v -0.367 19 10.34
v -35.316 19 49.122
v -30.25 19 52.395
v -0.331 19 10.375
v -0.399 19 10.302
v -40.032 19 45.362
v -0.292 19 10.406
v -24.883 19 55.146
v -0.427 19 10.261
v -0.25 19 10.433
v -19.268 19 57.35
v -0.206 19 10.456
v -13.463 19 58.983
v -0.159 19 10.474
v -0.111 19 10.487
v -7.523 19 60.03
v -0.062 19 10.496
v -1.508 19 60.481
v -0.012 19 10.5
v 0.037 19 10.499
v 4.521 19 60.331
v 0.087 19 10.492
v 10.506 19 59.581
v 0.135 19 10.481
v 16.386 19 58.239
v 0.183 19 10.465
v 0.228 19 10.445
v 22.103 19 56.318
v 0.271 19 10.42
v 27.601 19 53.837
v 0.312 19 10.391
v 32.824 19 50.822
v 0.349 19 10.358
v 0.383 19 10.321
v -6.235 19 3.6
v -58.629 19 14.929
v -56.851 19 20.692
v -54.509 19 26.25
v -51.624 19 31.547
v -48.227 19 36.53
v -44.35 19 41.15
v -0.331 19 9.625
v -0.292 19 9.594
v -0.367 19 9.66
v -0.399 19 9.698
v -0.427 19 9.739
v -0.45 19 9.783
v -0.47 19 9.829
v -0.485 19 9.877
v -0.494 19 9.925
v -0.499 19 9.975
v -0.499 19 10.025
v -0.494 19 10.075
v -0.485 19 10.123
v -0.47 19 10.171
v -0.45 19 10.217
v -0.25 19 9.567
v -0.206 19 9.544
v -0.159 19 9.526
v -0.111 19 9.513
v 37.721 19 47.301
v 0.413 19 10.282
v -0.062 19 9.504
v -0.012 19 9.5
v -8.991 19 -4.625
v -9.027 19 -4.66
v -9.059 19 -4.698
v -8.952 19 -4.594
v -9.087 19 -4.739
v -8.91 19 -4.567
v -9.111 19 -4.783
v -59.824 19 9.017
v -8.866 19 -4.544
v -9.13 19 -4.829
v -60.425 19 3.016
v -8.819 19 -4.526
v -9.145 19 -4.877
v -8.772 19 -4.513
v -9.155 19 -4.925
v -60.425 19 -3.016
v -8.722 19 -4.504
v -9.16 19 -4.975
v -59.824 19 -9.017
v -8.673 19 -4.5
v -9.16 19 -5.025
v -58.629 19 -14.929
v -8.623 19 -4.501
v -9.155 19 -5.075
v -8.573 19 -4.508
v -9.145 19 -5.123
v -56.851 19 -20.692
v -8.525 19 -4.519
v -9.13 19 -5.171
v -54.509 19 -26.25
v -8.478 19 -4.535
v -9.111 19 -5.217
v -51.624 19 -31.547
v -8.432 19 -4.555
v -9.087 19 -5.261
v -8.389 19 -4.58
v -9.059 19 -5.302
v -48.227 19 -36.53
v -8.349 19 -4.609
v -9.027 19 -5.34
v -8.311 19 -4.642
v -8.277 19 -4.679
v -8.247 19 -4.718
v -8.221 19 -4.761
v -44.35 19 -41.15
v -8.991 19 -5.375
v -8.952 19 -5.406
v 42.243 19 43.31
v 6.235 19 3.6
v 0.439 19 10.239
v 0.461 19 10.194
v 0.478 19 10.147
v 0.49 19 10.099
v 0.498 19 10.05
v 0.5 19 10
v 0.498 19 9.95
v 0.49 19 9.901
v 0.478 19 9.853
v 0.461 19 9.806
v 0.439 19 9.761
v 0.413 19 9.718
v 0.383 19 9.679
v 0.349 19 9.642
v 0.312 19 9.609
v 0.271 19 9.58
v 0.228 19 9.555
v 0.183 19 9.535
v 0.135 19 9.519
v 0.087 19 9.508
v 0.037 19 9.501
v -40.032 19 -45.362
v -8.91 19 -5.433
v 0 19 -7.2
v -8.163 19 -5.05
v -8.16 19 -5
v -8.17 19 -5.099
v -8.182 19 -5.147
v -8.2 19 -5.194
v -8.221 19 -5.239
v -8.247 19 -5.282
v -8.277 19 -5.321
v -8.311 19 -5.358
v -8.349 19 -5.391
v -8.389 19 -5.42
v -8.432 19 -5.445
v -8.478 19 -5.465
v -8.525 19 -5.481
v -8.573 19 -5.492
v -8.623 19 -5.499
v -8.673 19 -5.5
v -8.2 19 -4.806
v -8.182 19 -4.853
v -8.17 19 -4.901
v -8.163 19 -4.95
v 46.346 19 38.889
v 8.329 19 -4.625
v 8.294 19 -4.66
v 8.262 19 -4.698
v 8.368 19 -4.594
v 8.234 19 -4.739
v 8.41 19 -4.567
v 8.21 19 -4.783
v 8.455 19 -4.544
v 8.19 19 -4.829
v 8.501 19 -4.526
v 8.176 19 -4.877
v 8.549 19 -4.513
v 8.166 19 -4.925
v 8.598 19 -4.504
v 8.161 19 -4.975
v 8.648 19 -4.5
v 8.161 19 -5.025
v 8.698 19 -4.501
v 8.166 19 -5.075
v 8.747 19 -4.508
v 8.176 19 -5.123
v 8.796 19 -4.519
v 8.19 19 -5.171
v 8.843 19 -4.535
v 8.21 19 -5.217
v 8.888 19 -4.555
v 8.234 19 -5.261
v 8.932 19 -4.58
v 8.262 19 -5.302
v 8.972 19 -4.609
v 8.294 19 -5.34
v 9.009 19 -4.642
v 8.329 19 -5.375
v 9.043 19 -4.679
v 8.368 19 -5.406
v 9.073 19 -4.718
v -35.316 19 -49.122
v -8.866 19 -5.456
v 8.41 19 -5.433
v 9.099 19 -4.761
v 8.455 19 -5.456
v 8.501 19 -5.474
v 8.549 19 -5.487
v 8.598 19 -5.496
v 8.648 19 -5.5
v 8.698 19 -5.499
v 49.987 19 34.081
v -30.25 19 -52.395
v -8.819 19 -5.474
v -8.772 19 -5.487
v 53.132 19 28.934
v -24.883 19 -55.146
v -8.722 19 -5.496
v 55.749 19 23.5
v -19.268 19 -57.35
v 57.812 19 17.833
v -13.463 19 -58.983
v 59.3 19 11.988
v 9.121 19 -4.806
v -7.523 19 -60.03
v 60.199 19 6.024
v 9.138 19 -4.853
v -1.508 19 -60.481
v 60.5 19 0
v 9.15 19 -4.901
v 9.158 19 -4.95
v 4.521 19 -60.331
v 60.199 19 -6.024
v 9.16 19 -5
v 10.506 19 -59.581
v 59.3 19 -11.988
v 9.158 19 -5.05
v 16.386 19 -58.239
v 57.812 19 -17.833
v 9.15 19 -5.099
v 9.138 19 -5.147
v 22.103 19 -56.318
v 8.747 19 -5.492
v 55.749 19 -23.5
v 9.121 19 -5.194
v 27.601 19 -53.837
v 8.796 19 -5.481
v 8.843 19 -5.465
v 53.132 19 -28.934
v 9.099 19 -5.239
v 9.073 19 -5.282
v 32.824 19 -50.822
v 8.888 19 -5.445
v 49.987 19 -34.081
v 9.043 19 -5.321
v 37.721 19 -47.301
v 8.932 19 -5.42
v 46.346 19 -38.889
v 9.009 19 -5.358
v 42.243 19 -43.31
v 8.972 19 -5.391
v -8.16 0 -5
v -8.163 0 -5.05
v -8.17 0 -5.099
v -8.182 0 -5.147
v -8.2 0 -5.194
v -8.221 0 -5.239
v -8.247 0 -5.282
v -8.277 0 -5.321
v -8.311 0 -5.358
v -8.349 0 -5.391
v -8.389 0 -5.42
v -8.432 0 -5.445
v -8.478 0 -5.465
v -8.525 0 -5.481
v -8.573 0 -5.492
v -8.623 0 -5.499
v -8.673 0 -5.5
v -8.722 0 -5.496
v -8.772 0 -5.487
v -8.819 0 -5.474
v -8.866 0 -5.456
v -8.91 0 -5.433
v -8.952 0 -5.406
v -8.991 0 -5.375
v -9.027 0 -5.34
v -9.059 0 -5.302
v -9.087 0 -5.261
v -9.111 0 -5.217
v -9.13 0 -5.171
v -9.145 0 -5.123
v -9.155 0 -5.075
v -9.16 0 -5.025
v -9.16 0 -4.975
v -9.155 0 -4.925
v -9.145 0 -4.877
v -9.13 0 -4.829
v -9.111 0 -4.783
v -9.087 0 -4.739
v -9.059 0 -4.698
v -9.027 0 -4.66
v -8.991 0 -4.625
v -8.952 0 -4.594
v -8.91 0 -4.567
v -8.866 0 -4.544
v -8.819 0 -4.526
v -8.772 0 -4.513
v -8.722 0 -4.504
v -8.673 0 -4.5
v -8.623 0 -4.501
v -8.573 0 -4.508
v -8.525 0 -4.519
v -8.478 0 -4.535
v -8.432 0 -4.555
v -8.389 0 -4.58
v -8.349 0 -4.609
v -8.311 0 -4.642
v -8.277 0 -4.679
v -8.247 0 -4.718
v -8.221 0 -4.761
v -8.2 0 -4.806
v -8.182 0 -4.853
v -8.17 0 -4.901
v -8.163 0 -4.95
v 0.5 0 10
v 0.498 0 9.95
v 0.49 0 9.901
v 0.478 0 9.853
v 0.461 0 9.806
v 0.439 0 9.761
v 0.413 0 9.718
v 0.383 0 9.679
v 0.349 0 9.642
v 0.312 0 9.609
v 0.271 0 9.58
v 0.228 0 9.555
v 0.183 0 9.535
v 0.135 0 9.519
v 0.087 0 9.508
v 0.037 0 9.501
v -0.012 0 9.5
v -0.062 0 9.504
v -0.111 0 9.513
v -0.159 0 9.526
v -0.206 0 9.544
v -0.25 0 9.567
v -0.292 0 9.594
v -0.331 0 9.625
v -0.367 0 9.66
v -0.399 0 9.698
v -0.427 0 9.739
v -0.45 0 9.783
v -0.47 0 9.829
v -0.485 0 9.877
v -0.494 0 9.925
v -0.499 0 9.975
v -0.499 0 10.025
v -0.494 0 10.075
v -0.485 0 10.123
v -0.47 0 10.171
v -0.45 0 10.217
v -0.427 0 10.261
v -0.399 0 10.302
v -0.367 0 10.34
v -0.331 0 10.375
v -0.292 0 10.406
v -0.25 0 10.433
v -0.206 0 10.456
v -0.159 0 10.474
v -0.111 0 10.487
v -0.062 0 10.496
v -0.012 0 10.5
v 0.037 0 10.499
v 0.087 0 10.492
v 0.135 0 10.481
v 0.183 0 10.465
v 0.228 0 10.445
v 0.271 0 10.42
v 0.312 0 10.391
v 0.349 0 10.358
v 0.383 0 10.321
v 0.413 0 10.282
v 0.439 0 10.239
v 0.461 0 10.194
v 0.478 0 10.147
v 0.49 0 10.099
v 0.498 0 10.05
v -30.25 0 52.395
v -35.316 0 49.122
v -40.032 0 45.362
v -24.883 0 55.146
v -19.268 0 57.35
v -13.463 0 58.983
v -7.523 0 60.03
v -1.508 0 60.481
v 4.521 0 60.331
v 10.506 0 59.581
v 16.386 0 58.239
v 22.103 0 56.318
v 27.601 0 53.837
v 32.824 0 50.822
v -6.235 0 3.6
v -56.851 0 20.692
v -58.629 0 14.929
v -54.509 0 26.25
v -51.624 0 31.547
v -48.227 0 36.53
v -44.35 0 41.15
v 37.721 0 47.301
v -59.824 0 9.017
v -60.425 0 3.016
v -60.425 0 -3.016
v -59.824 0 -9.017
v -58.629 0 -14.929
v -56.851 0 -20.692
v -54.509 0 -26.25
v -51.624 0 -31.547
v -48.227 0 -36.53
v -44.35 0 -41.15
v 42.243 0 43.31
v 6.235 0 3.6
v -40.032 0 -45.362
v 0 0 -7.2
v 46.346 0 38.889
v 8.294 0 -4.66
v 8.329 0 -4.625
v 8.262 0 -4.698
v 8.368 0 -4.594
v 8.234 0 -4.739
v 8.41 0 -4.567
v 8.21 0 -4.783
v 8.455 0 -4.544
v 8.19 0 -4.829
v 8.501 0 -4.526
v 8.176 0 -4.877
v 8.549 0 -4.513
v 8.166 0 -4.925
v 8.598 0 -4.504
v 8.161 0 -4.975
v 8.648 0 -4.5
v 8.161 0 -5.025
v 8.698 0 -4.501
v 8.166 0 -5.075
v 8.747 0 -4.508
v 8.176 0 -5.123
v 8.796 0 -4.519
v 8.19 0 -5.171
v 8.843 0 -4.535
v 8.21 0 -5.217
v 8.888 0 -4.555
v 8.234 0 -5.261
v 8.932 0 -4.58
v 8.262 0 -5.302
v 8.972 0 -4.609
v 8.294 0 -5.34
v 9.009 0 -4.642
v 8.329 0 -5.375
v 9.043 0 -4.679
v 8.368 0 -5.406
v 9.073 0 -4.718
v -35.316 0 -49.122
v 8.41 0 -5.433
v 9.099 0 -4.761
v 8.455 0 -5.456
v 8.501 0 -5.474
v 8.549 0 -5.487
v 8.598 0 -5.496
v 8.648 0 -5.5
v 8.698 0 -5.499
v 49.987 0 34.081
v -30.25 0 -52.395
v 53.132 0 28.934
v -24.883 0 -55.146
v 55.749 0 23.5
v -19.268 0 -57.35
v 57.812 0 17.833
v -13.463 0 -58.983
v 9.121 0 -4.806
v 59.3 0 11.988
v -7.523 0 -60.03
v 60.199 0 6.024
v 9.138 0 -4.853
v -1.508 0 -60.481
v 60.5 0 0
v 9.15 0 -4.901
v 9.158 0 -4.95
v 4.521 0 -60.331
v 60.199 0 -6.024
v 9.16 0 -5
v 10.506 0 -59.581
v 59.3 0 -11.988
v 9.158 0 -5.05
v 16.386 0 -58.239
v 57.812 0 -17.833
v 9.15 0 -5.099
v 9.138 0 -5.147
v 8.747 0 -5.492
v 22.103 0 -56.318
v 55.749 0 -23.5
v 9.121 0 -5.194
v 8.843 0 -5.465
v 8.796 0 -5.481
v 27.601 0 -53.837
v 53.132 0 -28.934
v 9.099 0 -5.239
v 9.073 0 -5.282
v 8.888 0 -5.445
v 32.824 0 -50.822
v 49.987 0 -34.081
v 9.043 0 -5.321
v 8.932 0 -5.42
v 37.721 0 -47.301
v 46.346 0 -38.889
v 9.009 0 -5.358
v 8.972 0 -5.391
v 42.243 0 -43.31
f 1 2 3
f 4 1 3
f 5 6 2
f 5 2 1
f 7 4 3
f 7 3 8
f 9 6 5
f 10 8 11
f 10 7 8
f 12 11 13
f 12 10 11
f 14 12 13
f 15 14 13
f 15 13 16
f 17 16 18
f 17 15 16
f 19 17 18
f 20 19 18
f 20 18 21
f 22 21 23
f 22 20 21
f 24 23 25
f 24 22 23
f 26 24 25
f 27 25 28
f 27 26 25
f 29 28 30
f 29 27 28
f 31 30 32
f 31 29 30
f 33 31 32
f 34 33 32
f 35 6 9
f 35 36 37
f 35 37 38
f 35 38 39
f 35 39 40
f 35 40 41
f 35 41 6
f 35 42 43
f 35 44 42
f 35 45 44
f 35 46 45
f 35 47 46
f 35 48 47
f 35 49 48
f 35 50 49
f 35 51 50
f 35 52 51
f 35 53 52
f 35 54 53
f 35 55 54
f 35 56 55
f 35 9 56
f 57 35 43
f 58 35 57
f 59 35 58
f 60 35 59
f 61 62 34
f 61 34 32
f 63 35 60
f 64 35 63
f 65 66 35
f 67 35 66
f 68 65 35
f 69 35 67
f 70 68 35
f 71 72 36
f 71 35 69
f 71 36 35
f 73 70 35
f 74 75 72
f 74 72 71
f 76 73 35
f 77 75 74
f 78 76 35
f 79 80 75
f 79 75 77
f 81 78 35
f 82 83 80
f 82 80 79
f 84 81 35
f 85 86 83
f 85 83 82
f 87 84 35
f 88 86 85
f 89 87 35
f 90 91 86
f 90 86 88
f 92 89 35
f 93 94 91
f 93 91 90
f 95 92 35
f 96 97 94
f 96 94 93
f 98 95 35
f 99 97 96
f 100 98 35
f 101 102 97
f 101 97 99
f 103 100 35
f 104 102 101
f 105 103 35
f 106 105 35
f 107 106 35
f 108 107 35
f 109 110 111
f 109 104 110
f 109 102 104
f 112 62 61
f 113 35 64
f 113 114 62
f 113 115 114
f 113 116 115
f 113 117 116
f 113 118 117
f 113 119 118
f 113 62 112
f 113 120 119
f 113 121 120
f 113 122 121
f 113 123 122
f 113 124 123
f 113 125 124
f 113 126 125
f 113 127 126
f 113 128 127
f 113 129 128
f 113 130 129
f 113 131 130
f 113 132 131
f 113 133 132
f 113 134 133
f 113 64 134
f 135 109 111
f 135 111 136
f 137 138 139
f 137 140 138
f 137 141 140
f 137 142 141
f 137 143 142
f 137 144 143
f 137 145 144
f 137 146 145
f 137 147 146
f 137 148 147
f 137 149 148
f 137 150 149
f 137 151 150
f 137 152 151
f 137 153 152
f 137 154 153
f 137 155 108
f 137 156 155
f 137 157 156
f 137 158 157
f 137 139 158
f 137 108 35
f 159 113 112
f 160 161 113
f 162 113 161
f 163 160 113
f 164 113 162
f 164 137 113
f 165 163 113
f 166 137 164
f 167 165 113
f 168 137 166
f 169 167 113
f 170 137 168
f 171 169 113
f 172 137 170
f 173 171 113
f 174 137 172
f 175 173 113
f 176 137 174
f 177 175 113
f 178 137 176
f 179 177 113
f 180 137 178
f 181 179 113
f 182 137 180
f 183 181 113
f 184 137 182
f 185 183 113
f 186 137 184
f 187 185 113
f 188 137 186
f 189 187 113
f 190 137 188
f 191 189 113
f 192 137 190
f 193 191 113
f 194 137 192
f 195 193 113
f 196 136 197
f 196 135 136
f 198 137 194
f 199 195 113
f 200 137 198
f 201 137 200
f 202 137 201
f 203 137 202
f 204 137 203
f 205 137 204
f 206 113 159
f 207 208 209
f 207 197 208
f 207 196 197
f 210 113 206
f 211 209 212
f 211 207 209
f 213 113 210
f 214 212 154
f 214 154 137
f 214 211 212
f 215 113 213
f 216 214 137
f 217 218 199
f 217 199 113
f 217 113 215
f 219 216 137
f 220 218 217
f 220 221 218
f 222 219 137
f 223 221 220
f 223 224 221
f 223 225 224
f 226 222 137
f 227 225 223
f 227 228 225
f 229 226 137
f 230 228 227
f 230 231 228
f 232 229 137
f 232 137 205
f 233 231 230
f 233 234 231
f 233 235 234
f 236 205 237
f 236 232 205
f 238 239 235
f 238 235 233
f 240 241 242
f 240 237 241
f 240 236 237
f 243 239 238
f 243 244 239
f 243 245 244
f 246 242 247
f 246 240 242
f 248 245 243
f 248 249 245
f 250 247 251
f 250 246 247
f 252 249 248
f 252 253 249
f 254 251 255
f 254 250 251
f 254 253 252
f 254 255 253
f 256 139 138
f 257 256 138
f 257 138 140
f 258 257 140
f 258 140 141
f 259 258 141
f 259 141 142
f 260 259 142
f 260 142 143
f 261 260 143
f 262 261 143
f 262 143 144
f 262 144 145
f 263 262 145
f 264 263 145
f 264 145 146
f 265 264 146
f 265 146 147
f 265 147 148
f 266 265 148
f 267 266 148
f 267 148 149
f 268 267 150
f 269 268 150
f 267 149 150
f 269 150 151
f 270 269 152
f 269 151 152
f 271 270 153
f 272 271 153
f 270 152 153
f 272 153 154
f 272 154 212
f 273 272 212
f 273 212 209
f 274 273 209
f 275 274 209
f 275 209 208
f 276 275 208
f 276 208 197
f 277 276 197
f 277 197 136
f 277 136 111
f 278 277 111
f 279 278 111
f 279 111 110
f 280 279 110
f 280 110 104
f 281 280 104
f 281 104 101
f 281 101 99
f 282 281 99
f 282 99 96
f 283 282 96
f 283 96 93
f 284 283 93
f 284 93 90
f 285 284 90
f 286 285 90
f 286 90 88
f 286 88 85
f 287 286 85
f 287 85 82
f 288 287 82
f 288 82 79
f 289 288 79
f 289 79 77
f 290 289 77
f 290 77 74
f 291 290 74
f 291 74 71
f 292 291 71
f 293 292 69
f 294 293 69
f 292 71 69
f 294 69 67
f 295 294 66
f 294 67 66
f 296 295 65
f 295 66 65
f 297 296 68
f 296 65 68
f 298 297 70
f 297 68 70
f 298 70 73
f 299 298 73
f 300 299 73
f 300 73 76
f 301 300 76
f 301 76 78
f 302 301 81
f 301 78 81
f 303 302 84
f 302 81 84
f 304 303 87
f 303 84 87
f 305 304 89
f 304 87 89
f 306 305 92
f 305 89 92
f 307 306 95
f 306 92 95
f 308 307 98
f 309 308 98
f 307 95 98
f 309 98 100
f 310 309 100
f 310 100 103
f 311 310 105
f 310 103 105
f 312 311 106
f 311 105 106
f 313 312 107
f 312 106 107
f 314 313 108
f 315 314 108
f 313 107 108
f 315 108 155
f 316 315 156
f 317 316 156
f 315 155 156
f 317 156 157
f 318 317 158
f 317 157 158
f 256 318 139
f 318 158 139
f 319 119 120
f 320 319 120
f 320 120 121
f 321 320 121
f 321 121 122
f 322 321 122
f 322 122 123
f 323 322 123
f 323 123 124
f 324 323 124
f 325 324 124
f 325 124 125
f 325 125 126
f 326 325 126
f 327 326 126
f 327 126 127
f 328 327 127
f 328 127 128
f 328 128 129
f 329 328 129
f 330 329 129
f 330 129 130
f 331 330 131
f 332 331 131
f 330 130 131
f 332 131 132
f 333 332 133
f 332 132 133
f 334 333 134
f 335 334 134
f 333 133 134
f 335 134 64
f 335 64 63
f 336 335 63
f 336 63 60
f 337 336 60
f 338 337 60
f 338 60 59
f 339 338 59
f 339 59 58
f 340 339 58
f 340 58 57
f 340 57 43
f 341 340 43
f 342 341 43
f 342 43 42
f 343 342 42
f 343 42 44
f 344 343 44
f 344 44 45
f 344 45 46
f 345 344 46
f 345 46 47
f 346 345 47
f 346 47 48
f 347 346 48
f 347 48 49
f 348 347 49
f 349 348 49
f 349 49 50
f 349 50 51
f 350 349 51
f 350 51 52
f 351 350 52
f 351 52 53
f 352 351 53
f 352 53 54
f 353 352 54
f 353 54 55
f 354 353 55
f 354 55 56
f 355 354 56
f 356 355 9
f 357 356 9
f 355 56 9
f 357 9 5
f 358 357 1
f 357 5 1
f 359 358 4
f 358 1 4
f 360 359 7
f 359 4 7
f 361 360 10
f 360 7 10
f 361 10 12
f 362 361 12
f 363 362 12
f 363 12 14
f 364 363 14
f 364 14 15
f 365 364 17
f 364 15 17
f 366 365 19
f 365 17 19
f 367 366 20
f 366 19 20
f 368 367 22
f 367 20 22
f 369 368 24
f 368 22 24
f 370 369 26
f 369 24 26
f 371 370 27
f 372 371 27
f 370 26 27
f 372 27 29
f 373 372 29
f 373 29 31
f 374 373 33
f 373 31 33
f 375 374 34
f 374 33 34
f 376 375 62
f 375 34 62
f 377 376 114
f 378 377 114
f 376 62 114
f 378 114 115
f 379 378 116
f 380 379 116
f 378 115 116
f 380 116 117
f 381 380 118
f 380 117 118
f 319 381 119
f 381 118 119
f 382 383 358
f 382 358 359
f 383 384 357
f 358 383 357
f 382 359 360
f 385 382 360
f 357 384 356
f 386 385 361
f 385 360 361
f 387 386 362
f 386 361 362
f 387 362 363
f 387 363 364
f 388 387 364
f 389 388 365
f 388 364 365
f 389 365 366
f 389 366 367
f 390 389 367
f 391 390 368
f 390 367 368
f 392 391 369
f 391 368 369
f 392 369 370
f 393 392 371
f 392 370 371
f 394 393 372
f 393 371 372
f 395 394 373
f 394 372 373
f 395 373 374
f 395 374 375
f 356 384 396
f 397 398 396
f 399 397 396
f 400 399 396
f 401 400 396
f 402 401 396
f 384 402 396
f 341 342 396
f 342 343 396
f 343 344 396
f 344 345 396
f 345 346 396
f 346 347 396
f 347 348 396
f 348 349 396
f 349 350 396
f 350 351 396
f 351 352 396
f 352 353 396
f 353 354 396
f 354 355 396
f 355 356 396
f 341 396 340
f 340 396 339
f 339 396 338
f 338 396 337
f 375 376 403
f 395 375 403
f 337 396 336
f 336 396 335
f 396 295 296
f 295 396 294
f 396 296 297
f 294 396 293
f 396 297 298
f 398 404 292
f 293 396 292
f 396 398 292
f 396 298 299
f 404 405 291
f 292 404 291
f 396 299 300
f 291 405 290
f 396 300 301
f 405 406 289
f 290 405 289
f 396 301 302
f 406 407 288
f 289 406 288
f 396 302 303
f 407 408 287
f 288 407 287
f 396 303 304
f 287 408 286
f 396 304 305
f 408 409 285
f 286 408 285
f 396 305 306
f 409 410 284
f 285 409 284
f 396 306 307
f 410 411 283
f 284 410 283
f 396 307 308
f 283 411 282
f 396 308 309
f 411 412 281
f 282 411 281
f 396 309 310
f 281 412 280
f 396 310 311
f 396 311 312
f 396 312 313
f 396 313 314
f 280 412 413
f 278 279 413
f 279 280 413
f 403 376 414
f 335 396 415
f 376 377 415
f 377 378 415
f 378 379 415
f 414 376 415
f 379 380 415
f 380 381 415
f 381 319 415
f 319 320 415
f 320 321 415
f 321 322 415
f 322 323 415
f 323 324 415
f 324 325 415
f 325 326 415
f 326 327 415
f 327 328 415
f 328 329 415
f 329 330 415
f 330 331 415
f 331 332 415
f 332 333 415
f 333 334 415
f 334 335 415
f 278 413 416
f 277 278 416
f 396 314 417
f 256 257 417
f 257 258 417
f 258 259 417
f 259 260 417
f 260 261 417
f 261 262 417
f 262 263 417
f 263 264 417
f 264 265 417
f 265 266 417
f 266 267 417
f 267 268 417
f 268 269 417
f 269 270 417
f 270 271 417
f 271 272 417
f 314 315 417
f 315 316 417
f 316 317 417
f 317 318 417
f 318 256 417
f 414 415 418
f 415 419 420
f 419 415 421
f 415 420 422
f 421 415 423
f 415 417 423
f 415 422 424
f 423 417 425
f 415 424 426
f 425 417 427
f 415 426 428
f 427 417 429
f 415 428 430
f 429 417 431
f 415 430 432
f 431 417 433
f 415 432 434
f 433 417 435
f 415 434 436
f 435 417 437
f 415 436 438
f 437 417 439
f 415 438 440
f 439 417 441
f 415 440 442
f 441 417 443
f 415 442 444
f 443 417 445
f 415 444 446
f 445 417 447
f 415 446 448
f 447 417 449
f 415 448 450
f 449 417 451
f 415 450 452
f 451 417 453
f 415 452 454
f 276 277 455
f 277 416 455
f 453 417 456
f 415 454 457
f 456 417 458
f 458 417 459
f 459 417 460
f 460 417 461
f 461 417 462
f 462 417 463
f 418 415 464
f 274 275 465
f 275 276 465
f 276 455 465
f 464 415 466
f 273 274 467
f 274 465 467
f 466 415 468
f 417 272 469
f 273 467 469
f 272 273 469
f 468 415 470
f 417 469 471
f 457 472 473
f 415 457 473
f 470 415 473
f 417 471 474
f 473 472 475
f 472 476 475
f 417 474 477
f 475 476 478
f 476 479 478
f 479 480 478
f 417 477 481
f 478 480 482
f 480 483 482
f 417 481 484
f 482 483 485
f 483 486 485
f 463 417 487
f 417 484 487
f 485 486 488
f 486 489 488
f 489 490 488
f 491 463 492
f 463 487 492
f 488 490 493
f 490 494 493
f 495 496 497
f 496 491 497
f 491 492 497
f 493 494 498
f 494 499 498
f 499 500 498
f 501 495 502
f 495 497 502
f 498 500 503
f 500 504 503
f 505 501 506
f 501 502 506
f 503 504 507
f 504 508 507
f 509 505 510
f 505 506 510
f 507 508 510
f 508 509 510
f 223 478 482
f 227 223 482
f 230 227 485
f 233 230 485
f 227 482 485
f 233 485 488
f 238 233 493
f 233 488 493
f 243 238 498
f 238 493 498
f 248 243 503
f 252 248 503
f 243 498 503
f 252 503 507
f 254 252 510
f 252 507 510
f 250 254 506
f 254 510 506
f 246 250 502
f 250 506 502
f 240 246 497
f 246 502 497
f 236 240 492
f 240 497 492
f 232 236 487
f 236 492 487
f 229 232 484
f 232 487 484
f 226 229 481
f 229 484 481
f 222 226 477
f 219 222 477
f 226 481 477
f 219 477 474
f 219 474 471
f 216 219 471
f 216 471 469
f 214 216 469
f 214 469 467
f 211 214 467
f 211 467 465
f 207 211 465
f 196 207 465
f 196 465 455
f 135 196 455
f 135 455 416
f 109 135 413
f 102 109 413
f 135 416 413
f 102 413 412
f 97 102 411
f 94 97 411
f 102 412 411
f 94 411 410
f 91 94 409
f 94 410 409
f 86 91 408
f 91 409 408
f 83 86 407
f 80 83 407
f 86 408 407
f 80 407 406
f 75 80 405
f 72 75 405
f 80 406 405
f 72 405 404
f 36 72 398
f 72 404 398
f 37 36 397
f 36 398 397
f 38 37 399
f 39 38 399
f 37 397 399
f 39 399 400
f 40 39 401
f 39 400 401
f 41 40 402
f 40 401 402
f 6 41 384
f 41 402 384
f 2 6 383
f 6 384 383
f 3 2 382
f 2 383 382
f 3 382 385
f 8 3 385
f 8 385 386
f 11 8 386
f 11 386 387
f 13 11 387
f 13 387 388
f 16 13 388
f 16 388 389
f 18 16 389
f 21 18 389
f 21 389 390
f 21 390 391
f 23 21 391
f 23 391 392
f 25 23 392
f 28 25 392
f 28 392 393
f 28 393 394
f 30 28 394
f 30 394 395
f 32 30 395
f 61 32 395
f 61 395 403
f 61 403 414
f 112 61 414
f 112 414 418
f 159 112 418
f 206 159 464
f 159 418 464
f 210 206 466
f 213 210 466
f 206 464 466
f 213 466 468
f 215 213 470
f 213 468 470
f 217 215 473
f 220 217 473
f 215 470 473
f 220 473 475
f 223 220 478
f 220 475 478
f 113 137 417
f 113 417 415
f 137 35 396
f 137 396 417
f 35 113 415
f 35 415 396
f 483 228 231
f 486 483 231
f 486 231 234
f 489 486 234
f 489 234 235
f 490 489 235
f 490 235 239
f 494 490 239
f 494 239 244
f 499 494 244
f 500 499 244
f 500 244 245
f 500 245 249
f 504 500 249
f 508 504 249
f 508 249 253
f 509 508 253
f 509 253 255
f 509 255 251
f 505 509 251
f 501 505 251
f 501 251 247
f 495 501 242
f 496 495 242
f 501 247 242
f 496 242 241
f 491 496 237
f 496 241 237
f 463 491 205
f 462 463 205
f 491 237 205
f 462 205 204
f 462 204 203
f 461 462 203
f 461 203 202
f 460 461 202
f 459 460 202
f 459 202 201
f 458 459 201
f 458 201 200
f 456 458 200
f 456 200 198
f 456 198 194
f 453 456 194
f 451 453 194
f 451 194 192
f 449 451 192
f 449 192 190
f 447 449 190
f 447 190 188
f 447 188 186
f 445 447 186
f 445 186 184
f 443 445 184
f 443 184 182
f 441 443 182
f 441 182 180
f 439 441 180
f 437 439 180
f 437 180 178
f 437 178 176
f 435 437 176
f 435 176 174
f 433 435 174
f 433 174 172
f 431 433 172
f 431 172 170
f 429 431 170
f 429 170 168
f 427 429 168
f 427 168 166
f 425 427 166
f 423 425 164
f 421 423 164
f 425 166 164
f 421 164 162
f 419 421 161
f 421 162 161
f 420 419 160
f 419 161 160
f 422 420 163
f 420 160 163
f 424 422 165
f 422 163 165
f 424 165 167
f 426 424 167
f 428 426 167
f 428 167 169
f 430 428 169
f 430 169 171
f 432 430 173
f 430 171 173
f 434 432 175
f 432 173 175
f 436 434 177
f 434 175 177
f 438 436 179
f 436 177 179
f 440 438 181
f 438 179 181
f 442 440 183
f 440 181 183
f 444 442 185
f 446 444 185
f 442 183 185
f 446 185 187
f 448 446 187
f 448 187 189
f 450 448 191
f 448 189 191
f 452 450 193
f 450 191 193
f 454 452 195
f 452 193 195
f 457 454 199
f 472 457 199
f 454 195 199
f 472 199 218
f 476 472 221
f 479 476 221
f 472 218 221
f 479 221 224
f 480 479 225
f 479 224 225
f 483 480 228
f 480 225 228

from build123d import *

# Parameters (mm, degrees)
SKETCH1_R           = 60.5
BOSS_EXTRUDE1_DEPTH = 19
SKETCH2_R           = 0.5
CUT_EXTRUDE2_DEPTH  = 20


with BuildPart() as part:
    # Sketch1 → Boss-Extrude1 (new body)
    with BuildSketch(Plane(origin=(0, 0, 0), x_dir=(1, 0, 0), z_dir=(0, 1, 0))):
        Circle(SKETCH1_R)
    extrude(amount=BOSS_EXTRUDE1_DEPTH)

    # Sketch2 → Cut-Extrude2 (cut, through all)
    with BuildSketch(Plane(origin=(0, 19, 0), x_dir=(1, 0, 0), z_dir=(0, 1, 0))):
        with Locations((-8.660254038, 5)):
            Circle(SKETCH2_R)
        with Locations((8.660254038, 5)):
            Circle(SKETCH2_R)
        with Locations((0, -10)):
            Circle(SKETCH2_R)
        Polygon((0, 7.2), (6.235382907, -3.6), (-6.235382907, -3.6), align=None)
    extrude(amount=-CUT_EXTRUDE2_DEPTH, mode=Mode.SUBTRACT)


solid = part.part
